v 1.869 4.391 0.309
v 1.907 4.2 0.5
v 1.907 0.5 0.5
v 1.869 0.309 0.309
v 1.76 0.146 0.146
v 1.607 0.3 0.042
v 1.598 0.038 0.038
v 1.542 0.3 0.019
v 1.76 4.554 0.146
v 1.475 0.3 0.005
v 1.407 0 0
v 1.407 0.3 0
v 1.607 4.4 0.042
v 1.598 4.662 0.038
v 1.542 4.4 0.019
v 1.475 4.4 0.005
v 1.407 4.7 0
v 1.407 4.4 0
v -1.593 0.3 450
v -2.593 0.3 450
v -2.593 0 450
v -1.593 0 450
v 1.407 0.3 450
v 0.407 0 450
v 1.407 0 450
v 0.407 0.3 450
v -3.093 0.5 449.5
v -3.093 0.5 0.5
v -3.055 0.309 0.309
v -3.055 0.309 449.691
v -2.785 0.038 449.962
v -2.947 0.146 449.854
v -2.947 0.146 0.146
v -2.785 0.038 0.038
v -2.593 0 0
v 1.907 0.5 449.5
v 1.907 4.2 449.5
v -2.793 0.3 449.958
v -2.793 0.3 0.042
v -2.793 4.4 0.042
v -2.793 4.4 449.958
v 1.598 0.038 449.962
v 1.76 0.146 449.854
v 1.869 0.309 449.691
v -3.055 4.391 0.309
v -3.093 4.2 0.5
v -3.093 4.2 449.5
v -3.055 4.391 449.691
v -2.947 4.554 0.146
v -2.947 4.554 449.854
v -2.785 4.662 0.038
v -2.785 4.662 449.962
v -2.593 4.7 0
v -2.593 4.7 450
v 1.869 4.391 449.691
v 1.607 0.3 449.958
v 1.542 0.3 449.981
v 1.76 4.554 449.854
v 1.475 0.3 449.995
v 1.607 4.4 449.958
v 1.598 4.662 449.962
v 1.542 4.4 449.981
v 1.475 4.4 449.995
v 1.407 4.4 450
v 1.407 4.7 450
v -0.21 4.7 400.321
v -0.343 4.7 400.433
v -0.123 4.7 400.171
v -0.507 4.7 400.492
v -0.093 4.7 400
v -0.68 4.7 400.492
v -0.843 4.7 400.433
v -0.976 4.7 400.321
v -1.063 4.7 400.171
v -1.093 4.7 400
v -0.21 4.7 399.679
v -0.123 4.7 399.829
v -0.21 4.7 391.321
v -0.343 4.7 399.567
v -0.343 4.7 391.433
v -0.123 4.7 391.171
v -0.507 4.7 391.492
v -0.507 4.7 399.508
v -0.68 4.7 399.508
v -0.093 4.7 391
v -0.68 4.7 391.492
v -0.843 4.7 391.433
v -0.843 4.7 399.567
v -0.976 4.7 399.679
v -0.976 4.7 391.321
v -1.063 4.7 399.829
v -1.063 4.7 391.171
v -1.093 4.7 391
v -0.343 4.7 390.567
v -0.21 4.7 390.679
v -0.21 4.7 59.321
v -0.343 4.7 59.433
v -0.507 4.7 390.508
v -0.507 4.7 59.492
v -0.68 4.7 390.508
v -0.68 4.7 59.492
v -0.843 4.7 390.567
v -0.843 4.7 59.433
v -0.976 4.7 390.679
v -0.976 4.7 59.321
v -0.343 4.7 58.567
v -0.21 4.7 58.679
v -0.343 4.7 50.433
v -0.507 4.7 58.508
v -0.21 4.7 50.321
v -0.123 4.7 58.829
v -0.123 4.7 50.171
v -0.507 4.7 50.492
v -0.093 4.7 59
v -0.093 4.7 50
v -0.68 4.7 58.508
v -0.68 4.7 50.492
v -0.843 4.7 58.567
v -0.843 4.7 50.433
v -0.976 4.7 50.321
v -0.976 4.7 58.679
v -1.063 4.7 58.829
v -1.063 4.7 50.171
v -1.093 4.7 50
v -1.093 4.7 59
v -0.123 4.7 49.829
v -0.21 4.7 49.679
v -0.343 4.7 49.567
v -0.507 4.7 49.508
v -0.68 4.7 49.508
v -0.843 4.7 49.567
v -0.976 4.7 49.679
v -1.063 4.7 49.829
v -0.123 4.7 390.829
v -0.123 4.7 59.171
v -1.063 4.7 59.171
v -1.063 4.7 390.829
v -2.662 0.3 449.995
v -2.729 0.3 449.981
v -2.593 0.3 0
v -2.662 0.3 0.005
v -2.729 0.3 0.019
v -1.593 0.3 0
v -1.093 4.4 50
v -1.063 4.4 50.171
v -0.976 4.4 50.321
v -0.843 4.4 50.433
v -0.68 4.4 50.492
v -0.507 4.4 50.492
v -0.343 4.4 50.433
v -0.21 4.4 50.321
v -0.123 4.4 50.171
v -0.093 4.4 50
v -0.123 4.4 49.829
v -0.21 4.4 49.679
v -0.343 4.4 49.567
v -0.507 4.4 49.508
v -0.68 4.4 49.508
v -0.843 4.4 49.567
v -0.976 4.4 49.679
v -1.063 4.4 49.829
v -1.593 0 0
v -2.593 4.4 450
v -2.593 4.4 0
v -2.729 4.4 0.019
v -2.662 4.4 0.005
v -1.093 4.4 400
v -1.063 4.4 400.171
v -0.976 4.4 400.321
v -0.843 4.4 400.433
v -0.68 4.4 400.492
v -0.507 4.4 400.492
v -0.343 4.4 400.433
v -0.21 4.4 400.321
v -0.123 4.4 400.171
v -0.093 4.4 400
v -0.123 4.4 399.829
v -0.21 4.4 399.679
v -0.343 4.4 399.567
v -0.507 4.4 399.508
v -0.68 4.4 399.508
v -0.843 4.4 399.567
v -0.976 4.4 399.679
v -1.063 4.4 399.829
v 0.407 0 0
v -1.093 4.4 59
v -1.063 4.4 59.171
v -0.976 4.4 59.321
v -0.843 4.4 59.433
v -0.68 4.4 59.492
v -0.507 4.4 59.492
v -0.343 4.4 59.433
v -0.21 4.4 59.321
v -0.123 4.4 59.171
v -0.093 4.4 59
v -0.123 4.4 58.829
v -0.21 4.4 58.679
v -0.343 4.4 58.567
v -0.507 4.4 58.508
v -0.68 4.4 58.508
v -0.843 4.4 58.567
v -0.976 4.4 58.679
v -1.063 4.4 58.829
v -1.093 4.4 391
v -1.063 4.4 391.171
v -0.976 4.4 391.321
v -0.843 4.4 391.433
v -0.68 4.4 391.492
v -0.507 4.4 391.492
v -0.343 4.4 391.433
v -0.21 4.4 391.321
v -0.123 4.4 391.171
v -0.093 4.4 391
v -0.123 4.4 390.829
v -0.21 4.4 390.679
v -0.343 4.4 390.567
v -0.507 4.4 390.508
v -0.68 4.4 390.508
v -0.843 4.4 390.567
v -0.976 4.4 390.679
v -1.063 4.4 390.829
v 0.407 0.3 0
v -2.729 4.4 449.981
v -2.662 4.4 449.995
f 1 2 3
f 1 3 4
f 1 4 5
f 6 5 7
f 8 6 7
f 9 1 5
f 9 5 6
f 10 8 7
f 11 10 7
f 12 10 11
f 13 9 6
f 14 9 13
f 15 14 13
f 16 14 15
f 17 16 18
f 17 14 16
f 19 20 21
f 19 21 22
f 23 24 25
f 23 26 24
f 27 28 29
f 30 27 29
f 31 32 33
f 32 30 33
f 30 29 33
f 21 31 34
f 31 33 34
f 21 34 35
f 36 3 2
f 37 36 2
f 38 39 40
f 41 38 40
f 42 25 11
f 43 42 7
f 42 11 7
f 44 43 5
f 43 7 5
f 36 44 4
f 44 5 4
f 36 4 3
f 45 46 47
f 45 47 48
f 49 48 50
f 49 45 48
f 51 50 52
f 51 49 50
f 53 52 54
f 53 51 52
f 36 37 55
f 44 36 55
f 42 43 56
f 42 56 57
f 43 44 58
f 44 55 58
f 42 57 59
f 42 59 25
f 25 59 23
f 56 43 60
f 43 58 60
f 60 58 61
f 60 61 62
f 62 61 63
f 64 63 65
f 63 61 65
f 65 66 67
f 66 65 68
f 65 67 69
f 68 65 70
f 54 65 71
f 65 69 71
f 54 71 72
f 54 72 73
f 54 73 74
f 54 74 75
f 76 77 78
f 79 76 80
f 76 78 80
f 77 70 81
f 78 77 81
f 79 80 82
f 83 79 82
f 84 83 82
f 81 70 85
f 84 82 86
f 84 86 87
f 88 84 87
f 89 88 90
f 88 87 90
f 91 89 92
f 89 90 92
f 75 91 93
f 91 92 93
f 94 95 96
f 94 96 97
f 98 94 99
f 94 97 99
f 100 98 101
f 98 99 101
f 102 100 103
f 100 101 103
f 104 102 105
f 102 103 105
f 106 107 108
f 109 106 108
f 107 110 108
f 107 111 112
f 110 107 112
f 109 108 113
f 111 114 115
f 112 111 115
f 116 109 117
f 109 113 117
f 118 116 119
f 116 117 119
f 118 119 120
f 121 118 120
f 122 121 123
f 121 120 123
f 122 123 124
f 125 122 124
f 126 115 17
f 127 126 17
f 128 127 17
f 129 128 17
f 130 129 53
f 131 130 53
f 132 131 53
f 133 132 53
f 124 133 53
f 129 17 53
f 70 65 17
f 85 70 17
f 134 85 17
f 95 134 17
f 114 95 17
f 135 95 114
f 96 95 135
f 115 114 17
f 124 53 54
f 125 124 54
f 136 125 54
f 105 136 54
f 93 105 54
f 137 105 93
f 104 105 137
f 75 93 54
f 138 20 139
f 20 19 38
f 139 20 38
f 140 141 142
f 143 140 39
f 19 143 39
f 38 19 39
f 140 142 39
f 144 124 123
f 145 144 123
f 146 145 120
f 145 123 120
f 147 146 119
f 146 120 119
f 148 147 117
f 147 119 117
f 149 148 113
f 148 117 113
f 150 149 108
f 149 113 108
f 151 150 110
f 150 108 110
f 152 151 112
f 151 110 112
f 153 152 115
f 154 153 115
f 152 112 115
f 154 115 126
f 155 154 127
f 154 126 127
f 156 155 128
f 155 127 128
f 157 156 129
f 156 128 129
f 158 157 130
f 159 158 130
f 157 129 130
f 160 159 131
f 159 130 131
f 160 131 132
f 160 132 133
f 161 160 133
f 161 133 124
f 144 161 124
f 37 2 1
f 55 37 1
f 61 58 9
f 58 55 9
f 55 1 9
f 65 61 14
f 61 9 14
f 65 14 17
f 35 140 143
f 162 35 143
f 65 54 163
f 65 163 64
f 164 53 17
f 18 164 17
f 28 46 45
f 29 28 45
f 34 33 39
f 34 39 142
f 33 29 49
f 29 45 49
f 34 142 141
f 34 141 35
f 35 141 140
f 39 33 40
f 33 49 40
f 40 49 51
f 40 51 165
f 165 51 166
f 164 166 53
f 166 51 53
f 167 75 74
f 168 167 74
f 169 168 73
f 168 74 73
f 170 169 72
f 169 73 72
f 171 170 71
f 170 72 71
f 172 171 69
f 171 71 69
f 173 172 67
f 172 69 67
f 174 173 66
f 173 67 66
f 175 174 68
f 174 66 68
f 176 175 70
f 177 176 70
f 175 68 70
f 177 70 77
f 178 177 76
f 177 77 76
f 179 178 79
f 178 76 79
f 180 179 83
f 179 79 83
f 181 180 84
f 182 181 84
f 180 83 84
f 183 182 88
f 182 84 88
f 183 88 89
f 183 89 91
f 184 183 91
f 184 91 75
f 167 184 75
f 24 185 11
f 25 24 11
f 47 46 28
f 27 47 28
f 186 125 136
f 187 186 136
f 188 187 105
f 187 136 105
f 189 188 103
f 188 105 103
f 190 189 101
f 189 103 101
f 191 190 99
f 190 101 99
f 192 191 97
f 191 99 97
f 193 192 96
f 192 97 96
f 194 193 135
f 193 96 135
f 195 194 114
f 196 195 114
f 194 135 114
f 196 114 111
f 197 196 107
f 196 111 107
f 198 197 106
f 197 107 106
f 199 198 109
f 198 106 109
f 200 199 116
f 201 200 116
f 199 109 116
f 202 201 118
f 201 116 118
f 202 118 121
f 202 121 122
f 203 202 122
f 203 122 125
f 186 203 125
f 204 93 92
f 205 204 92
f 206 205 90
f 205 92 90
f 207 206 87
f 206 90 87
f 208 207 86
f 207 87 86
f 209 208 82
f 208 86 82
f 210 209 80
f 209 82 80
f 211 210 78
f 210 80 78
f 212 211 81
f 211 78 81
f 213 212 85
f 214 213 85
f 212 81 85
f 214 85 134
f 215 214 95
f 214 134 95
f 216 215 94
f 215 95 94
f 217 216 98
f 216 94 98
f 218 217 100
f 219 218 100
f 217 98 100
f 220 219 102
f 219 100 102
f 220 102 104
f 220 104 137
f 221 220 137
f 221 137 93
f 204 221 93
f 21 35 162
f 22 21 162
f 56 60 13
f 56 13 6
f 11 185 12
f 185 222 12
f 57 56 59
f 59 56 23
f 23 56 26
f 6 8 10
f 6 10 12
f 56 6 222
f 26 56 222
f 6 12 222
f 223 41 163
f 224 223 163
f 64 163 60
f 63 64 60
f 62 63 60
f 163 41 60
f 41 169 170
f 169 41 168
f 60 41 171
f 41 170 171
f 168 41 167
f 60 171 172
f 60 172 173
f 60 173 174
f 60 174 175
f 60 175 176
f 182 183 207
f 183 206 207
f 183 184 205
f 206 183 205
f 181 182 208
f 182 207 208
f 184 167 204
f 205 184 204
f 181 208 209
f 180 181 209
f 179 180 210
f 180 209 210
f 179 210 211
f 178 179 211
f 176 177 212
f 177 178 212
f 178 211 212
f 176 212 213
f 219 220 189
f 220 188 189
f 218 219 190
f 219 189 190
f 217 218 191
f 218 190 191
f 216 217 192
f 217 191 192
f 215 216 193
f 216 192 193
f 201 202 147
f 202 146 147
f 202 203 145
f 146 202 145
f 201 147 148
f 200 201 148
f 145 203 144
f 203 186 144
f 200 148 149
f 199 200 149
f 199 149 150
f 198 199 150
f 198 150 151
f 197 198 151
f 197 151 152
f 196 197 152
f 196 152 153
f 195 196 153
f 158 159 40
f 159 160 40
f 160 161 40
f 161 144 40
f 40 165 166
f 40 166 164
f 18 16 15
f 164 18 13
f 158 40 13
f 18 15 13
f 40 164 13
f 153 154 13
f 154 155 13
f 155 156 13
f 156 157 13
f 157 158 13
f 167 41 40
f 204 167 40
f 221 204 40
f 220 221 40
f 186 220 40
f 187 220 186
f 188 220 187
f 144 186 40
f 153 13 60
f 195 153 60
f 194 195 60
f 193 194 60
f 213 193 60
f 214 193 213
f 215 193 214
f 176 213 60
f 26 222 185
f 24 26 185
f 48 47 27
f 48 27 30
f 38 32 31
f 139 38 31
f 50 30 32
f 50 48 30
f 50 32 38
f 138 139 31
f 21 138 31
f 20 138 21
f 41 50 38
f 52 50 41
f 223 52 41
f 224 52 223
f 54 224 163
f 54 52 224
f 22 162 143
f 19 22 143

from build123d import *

# Parameters (mm, degrees)
F1_DEPTH    = 450
F2_T1_DEPTH = 452.5
F2_T3_DEPTH = 7.2
F3_R        = 0.5
F4_DEPTH    = 25


# Not quite as in the source:
# - a fillet or chamfer that OpenCascade refuses, or shapes differently, is made with other operations: its cross-section is extruded or revolved along the edge and cut away or added


with BuildPart() as f1:
    # F0 (on Top) → F1 (new body)
    with BuildSketch(Plane.XY):
        Polygon((-3.0933290763, 0), (-1.5933290763, 0), (-1.5933290763, 0.3), (-2.7933290763, 0.3), (-2.7933290763, 4.4), (1.6066709237, 4.4), (1.6066709237, 0.3), (0.4066709237, 0.3), (0.4066709237, 0), (1.9066709237, 0), (1.9066709237, 4.7), (-3.0933290763, 4.7), align=None)
    extrude(amount=F1_DEPTH)

    # F2: fillet of radius 0.5 on 8 edges, made by hand

    # F2_s2 → F2_t1 (cut)
    with BuildSketch(Plane.XY.offset(-1.25)):
        with BuildLine():
            ThreePointArc((-3.0933290763, 4.2), (-2.9468824669, 4.5535533906), (-2.5933290763, 4.7))
            Line((-2.5933290763, 4.7), (-3.0933290763, 4.7))
            Line((-3.0933290763, 4.7), (-3.0933290763, 4.2))
        make_face()
        with BuildLine():
            ThreePointArc((-3.0933290763, 0.5), (-2.9468824669, 0.1464466094), (-2.5933290763, 0))
            Line((-2.5933290763, 0), (-3.0933290763, 0))
            Line((-3.0933290763, 0), (-3.0933290763, 0.5))
        make_face()
        with BuildLine():
            ThreePointArc((1.4066709237, 0), (1.7602243143, 0.1464466094), (1.9066709237, 0.5))
            Line((1.9066709237, 0.5), (1.9066709237, 0))
            Line((1.9066709237, 0), (1.4066709237, 0))
        make_face()
        with BuildLine():
            ThreePointArc((1.9066709237, 4.2), (1.7602243143, 4.5535533906), (1.4066709237, 4.7))
            Line((1.4066709237, 4.7), (1.9066709237, 4.7))
            Line((1.9066709237, 4.7), (1.9066709237, 4.2))
        make_face()
    extrude(amount=F2_T1_DEPTH, mode=Mode.SUBTRACT)

    # F2_s4 → F2_t3 (cut)
    with BuildSketch(Plane.XZ.offset(-5.95)):
        with BuildLine():
            ThreePointArc((-3.0933290763, 0.5), (-2.9468824669, 0.1464466094), (-2.5933290763, 0))
            Line((-2.5933290763, 0), (-3.0933290763, 0))
            Line((-3.0933290763, 0), (-3.0933290763, 0.5))
        make_face()
        with BuildLine():
            ThreePointArc((-3.0933290763, 449.5), (-2.9468824669, 449.8535533906), (-2.5933290763, 450))
            Line((-2.5933290763, 450), (-3.0933290763, 450))
            Line((-3.0933290763, 450), (-3.0933290763, 449.5))
        make_face()
        with BuildLine():
            ThreePointArc((1.9066709237, 0.5), (1.7602243143, 0.1464466094), (1.4066709237, 0))
            Line((1.4066709237, 0), (1.9066709237, 0))
            Line((1.9066709237, 0), (1.9066709237, 0.5))
        make_face()
        with BuildLine():
            ThreePointArc((1.9066709237, 449.5), (1.7602243143, 449.8535533906), (1.4066709237, 450))
            Line((1.4066709237, 450), (1.9066709237, 450))
            Line((1.9066709237, 450), (1.9066709237, 449.5))
        make_face()
    extrude(amount=F2_T3_DEPTH, mode=Mode.SUBTRACT)

    # F3 (on face) → F4 (cut)
    with BuildSketch(Plane(origin=(0, 4.7, 0), x_dir=(-1, 0, 0), z_dir=(0, 1, 0))):
        with Locations((0.5933290763, 400)):
            Circle(F3_R)
        with Locations((0.5933290763, 391)):
            Circle(F3_R)
        with Locations((0.5933290763, 50)):
            Circle(F3_R)
        with Locations((0.5933290763, 59)):
            Circle(F3_R)
    extrude(amount=-F4_DEPTH, mode=Mode.SUBTRACT)


solid = f1.part
